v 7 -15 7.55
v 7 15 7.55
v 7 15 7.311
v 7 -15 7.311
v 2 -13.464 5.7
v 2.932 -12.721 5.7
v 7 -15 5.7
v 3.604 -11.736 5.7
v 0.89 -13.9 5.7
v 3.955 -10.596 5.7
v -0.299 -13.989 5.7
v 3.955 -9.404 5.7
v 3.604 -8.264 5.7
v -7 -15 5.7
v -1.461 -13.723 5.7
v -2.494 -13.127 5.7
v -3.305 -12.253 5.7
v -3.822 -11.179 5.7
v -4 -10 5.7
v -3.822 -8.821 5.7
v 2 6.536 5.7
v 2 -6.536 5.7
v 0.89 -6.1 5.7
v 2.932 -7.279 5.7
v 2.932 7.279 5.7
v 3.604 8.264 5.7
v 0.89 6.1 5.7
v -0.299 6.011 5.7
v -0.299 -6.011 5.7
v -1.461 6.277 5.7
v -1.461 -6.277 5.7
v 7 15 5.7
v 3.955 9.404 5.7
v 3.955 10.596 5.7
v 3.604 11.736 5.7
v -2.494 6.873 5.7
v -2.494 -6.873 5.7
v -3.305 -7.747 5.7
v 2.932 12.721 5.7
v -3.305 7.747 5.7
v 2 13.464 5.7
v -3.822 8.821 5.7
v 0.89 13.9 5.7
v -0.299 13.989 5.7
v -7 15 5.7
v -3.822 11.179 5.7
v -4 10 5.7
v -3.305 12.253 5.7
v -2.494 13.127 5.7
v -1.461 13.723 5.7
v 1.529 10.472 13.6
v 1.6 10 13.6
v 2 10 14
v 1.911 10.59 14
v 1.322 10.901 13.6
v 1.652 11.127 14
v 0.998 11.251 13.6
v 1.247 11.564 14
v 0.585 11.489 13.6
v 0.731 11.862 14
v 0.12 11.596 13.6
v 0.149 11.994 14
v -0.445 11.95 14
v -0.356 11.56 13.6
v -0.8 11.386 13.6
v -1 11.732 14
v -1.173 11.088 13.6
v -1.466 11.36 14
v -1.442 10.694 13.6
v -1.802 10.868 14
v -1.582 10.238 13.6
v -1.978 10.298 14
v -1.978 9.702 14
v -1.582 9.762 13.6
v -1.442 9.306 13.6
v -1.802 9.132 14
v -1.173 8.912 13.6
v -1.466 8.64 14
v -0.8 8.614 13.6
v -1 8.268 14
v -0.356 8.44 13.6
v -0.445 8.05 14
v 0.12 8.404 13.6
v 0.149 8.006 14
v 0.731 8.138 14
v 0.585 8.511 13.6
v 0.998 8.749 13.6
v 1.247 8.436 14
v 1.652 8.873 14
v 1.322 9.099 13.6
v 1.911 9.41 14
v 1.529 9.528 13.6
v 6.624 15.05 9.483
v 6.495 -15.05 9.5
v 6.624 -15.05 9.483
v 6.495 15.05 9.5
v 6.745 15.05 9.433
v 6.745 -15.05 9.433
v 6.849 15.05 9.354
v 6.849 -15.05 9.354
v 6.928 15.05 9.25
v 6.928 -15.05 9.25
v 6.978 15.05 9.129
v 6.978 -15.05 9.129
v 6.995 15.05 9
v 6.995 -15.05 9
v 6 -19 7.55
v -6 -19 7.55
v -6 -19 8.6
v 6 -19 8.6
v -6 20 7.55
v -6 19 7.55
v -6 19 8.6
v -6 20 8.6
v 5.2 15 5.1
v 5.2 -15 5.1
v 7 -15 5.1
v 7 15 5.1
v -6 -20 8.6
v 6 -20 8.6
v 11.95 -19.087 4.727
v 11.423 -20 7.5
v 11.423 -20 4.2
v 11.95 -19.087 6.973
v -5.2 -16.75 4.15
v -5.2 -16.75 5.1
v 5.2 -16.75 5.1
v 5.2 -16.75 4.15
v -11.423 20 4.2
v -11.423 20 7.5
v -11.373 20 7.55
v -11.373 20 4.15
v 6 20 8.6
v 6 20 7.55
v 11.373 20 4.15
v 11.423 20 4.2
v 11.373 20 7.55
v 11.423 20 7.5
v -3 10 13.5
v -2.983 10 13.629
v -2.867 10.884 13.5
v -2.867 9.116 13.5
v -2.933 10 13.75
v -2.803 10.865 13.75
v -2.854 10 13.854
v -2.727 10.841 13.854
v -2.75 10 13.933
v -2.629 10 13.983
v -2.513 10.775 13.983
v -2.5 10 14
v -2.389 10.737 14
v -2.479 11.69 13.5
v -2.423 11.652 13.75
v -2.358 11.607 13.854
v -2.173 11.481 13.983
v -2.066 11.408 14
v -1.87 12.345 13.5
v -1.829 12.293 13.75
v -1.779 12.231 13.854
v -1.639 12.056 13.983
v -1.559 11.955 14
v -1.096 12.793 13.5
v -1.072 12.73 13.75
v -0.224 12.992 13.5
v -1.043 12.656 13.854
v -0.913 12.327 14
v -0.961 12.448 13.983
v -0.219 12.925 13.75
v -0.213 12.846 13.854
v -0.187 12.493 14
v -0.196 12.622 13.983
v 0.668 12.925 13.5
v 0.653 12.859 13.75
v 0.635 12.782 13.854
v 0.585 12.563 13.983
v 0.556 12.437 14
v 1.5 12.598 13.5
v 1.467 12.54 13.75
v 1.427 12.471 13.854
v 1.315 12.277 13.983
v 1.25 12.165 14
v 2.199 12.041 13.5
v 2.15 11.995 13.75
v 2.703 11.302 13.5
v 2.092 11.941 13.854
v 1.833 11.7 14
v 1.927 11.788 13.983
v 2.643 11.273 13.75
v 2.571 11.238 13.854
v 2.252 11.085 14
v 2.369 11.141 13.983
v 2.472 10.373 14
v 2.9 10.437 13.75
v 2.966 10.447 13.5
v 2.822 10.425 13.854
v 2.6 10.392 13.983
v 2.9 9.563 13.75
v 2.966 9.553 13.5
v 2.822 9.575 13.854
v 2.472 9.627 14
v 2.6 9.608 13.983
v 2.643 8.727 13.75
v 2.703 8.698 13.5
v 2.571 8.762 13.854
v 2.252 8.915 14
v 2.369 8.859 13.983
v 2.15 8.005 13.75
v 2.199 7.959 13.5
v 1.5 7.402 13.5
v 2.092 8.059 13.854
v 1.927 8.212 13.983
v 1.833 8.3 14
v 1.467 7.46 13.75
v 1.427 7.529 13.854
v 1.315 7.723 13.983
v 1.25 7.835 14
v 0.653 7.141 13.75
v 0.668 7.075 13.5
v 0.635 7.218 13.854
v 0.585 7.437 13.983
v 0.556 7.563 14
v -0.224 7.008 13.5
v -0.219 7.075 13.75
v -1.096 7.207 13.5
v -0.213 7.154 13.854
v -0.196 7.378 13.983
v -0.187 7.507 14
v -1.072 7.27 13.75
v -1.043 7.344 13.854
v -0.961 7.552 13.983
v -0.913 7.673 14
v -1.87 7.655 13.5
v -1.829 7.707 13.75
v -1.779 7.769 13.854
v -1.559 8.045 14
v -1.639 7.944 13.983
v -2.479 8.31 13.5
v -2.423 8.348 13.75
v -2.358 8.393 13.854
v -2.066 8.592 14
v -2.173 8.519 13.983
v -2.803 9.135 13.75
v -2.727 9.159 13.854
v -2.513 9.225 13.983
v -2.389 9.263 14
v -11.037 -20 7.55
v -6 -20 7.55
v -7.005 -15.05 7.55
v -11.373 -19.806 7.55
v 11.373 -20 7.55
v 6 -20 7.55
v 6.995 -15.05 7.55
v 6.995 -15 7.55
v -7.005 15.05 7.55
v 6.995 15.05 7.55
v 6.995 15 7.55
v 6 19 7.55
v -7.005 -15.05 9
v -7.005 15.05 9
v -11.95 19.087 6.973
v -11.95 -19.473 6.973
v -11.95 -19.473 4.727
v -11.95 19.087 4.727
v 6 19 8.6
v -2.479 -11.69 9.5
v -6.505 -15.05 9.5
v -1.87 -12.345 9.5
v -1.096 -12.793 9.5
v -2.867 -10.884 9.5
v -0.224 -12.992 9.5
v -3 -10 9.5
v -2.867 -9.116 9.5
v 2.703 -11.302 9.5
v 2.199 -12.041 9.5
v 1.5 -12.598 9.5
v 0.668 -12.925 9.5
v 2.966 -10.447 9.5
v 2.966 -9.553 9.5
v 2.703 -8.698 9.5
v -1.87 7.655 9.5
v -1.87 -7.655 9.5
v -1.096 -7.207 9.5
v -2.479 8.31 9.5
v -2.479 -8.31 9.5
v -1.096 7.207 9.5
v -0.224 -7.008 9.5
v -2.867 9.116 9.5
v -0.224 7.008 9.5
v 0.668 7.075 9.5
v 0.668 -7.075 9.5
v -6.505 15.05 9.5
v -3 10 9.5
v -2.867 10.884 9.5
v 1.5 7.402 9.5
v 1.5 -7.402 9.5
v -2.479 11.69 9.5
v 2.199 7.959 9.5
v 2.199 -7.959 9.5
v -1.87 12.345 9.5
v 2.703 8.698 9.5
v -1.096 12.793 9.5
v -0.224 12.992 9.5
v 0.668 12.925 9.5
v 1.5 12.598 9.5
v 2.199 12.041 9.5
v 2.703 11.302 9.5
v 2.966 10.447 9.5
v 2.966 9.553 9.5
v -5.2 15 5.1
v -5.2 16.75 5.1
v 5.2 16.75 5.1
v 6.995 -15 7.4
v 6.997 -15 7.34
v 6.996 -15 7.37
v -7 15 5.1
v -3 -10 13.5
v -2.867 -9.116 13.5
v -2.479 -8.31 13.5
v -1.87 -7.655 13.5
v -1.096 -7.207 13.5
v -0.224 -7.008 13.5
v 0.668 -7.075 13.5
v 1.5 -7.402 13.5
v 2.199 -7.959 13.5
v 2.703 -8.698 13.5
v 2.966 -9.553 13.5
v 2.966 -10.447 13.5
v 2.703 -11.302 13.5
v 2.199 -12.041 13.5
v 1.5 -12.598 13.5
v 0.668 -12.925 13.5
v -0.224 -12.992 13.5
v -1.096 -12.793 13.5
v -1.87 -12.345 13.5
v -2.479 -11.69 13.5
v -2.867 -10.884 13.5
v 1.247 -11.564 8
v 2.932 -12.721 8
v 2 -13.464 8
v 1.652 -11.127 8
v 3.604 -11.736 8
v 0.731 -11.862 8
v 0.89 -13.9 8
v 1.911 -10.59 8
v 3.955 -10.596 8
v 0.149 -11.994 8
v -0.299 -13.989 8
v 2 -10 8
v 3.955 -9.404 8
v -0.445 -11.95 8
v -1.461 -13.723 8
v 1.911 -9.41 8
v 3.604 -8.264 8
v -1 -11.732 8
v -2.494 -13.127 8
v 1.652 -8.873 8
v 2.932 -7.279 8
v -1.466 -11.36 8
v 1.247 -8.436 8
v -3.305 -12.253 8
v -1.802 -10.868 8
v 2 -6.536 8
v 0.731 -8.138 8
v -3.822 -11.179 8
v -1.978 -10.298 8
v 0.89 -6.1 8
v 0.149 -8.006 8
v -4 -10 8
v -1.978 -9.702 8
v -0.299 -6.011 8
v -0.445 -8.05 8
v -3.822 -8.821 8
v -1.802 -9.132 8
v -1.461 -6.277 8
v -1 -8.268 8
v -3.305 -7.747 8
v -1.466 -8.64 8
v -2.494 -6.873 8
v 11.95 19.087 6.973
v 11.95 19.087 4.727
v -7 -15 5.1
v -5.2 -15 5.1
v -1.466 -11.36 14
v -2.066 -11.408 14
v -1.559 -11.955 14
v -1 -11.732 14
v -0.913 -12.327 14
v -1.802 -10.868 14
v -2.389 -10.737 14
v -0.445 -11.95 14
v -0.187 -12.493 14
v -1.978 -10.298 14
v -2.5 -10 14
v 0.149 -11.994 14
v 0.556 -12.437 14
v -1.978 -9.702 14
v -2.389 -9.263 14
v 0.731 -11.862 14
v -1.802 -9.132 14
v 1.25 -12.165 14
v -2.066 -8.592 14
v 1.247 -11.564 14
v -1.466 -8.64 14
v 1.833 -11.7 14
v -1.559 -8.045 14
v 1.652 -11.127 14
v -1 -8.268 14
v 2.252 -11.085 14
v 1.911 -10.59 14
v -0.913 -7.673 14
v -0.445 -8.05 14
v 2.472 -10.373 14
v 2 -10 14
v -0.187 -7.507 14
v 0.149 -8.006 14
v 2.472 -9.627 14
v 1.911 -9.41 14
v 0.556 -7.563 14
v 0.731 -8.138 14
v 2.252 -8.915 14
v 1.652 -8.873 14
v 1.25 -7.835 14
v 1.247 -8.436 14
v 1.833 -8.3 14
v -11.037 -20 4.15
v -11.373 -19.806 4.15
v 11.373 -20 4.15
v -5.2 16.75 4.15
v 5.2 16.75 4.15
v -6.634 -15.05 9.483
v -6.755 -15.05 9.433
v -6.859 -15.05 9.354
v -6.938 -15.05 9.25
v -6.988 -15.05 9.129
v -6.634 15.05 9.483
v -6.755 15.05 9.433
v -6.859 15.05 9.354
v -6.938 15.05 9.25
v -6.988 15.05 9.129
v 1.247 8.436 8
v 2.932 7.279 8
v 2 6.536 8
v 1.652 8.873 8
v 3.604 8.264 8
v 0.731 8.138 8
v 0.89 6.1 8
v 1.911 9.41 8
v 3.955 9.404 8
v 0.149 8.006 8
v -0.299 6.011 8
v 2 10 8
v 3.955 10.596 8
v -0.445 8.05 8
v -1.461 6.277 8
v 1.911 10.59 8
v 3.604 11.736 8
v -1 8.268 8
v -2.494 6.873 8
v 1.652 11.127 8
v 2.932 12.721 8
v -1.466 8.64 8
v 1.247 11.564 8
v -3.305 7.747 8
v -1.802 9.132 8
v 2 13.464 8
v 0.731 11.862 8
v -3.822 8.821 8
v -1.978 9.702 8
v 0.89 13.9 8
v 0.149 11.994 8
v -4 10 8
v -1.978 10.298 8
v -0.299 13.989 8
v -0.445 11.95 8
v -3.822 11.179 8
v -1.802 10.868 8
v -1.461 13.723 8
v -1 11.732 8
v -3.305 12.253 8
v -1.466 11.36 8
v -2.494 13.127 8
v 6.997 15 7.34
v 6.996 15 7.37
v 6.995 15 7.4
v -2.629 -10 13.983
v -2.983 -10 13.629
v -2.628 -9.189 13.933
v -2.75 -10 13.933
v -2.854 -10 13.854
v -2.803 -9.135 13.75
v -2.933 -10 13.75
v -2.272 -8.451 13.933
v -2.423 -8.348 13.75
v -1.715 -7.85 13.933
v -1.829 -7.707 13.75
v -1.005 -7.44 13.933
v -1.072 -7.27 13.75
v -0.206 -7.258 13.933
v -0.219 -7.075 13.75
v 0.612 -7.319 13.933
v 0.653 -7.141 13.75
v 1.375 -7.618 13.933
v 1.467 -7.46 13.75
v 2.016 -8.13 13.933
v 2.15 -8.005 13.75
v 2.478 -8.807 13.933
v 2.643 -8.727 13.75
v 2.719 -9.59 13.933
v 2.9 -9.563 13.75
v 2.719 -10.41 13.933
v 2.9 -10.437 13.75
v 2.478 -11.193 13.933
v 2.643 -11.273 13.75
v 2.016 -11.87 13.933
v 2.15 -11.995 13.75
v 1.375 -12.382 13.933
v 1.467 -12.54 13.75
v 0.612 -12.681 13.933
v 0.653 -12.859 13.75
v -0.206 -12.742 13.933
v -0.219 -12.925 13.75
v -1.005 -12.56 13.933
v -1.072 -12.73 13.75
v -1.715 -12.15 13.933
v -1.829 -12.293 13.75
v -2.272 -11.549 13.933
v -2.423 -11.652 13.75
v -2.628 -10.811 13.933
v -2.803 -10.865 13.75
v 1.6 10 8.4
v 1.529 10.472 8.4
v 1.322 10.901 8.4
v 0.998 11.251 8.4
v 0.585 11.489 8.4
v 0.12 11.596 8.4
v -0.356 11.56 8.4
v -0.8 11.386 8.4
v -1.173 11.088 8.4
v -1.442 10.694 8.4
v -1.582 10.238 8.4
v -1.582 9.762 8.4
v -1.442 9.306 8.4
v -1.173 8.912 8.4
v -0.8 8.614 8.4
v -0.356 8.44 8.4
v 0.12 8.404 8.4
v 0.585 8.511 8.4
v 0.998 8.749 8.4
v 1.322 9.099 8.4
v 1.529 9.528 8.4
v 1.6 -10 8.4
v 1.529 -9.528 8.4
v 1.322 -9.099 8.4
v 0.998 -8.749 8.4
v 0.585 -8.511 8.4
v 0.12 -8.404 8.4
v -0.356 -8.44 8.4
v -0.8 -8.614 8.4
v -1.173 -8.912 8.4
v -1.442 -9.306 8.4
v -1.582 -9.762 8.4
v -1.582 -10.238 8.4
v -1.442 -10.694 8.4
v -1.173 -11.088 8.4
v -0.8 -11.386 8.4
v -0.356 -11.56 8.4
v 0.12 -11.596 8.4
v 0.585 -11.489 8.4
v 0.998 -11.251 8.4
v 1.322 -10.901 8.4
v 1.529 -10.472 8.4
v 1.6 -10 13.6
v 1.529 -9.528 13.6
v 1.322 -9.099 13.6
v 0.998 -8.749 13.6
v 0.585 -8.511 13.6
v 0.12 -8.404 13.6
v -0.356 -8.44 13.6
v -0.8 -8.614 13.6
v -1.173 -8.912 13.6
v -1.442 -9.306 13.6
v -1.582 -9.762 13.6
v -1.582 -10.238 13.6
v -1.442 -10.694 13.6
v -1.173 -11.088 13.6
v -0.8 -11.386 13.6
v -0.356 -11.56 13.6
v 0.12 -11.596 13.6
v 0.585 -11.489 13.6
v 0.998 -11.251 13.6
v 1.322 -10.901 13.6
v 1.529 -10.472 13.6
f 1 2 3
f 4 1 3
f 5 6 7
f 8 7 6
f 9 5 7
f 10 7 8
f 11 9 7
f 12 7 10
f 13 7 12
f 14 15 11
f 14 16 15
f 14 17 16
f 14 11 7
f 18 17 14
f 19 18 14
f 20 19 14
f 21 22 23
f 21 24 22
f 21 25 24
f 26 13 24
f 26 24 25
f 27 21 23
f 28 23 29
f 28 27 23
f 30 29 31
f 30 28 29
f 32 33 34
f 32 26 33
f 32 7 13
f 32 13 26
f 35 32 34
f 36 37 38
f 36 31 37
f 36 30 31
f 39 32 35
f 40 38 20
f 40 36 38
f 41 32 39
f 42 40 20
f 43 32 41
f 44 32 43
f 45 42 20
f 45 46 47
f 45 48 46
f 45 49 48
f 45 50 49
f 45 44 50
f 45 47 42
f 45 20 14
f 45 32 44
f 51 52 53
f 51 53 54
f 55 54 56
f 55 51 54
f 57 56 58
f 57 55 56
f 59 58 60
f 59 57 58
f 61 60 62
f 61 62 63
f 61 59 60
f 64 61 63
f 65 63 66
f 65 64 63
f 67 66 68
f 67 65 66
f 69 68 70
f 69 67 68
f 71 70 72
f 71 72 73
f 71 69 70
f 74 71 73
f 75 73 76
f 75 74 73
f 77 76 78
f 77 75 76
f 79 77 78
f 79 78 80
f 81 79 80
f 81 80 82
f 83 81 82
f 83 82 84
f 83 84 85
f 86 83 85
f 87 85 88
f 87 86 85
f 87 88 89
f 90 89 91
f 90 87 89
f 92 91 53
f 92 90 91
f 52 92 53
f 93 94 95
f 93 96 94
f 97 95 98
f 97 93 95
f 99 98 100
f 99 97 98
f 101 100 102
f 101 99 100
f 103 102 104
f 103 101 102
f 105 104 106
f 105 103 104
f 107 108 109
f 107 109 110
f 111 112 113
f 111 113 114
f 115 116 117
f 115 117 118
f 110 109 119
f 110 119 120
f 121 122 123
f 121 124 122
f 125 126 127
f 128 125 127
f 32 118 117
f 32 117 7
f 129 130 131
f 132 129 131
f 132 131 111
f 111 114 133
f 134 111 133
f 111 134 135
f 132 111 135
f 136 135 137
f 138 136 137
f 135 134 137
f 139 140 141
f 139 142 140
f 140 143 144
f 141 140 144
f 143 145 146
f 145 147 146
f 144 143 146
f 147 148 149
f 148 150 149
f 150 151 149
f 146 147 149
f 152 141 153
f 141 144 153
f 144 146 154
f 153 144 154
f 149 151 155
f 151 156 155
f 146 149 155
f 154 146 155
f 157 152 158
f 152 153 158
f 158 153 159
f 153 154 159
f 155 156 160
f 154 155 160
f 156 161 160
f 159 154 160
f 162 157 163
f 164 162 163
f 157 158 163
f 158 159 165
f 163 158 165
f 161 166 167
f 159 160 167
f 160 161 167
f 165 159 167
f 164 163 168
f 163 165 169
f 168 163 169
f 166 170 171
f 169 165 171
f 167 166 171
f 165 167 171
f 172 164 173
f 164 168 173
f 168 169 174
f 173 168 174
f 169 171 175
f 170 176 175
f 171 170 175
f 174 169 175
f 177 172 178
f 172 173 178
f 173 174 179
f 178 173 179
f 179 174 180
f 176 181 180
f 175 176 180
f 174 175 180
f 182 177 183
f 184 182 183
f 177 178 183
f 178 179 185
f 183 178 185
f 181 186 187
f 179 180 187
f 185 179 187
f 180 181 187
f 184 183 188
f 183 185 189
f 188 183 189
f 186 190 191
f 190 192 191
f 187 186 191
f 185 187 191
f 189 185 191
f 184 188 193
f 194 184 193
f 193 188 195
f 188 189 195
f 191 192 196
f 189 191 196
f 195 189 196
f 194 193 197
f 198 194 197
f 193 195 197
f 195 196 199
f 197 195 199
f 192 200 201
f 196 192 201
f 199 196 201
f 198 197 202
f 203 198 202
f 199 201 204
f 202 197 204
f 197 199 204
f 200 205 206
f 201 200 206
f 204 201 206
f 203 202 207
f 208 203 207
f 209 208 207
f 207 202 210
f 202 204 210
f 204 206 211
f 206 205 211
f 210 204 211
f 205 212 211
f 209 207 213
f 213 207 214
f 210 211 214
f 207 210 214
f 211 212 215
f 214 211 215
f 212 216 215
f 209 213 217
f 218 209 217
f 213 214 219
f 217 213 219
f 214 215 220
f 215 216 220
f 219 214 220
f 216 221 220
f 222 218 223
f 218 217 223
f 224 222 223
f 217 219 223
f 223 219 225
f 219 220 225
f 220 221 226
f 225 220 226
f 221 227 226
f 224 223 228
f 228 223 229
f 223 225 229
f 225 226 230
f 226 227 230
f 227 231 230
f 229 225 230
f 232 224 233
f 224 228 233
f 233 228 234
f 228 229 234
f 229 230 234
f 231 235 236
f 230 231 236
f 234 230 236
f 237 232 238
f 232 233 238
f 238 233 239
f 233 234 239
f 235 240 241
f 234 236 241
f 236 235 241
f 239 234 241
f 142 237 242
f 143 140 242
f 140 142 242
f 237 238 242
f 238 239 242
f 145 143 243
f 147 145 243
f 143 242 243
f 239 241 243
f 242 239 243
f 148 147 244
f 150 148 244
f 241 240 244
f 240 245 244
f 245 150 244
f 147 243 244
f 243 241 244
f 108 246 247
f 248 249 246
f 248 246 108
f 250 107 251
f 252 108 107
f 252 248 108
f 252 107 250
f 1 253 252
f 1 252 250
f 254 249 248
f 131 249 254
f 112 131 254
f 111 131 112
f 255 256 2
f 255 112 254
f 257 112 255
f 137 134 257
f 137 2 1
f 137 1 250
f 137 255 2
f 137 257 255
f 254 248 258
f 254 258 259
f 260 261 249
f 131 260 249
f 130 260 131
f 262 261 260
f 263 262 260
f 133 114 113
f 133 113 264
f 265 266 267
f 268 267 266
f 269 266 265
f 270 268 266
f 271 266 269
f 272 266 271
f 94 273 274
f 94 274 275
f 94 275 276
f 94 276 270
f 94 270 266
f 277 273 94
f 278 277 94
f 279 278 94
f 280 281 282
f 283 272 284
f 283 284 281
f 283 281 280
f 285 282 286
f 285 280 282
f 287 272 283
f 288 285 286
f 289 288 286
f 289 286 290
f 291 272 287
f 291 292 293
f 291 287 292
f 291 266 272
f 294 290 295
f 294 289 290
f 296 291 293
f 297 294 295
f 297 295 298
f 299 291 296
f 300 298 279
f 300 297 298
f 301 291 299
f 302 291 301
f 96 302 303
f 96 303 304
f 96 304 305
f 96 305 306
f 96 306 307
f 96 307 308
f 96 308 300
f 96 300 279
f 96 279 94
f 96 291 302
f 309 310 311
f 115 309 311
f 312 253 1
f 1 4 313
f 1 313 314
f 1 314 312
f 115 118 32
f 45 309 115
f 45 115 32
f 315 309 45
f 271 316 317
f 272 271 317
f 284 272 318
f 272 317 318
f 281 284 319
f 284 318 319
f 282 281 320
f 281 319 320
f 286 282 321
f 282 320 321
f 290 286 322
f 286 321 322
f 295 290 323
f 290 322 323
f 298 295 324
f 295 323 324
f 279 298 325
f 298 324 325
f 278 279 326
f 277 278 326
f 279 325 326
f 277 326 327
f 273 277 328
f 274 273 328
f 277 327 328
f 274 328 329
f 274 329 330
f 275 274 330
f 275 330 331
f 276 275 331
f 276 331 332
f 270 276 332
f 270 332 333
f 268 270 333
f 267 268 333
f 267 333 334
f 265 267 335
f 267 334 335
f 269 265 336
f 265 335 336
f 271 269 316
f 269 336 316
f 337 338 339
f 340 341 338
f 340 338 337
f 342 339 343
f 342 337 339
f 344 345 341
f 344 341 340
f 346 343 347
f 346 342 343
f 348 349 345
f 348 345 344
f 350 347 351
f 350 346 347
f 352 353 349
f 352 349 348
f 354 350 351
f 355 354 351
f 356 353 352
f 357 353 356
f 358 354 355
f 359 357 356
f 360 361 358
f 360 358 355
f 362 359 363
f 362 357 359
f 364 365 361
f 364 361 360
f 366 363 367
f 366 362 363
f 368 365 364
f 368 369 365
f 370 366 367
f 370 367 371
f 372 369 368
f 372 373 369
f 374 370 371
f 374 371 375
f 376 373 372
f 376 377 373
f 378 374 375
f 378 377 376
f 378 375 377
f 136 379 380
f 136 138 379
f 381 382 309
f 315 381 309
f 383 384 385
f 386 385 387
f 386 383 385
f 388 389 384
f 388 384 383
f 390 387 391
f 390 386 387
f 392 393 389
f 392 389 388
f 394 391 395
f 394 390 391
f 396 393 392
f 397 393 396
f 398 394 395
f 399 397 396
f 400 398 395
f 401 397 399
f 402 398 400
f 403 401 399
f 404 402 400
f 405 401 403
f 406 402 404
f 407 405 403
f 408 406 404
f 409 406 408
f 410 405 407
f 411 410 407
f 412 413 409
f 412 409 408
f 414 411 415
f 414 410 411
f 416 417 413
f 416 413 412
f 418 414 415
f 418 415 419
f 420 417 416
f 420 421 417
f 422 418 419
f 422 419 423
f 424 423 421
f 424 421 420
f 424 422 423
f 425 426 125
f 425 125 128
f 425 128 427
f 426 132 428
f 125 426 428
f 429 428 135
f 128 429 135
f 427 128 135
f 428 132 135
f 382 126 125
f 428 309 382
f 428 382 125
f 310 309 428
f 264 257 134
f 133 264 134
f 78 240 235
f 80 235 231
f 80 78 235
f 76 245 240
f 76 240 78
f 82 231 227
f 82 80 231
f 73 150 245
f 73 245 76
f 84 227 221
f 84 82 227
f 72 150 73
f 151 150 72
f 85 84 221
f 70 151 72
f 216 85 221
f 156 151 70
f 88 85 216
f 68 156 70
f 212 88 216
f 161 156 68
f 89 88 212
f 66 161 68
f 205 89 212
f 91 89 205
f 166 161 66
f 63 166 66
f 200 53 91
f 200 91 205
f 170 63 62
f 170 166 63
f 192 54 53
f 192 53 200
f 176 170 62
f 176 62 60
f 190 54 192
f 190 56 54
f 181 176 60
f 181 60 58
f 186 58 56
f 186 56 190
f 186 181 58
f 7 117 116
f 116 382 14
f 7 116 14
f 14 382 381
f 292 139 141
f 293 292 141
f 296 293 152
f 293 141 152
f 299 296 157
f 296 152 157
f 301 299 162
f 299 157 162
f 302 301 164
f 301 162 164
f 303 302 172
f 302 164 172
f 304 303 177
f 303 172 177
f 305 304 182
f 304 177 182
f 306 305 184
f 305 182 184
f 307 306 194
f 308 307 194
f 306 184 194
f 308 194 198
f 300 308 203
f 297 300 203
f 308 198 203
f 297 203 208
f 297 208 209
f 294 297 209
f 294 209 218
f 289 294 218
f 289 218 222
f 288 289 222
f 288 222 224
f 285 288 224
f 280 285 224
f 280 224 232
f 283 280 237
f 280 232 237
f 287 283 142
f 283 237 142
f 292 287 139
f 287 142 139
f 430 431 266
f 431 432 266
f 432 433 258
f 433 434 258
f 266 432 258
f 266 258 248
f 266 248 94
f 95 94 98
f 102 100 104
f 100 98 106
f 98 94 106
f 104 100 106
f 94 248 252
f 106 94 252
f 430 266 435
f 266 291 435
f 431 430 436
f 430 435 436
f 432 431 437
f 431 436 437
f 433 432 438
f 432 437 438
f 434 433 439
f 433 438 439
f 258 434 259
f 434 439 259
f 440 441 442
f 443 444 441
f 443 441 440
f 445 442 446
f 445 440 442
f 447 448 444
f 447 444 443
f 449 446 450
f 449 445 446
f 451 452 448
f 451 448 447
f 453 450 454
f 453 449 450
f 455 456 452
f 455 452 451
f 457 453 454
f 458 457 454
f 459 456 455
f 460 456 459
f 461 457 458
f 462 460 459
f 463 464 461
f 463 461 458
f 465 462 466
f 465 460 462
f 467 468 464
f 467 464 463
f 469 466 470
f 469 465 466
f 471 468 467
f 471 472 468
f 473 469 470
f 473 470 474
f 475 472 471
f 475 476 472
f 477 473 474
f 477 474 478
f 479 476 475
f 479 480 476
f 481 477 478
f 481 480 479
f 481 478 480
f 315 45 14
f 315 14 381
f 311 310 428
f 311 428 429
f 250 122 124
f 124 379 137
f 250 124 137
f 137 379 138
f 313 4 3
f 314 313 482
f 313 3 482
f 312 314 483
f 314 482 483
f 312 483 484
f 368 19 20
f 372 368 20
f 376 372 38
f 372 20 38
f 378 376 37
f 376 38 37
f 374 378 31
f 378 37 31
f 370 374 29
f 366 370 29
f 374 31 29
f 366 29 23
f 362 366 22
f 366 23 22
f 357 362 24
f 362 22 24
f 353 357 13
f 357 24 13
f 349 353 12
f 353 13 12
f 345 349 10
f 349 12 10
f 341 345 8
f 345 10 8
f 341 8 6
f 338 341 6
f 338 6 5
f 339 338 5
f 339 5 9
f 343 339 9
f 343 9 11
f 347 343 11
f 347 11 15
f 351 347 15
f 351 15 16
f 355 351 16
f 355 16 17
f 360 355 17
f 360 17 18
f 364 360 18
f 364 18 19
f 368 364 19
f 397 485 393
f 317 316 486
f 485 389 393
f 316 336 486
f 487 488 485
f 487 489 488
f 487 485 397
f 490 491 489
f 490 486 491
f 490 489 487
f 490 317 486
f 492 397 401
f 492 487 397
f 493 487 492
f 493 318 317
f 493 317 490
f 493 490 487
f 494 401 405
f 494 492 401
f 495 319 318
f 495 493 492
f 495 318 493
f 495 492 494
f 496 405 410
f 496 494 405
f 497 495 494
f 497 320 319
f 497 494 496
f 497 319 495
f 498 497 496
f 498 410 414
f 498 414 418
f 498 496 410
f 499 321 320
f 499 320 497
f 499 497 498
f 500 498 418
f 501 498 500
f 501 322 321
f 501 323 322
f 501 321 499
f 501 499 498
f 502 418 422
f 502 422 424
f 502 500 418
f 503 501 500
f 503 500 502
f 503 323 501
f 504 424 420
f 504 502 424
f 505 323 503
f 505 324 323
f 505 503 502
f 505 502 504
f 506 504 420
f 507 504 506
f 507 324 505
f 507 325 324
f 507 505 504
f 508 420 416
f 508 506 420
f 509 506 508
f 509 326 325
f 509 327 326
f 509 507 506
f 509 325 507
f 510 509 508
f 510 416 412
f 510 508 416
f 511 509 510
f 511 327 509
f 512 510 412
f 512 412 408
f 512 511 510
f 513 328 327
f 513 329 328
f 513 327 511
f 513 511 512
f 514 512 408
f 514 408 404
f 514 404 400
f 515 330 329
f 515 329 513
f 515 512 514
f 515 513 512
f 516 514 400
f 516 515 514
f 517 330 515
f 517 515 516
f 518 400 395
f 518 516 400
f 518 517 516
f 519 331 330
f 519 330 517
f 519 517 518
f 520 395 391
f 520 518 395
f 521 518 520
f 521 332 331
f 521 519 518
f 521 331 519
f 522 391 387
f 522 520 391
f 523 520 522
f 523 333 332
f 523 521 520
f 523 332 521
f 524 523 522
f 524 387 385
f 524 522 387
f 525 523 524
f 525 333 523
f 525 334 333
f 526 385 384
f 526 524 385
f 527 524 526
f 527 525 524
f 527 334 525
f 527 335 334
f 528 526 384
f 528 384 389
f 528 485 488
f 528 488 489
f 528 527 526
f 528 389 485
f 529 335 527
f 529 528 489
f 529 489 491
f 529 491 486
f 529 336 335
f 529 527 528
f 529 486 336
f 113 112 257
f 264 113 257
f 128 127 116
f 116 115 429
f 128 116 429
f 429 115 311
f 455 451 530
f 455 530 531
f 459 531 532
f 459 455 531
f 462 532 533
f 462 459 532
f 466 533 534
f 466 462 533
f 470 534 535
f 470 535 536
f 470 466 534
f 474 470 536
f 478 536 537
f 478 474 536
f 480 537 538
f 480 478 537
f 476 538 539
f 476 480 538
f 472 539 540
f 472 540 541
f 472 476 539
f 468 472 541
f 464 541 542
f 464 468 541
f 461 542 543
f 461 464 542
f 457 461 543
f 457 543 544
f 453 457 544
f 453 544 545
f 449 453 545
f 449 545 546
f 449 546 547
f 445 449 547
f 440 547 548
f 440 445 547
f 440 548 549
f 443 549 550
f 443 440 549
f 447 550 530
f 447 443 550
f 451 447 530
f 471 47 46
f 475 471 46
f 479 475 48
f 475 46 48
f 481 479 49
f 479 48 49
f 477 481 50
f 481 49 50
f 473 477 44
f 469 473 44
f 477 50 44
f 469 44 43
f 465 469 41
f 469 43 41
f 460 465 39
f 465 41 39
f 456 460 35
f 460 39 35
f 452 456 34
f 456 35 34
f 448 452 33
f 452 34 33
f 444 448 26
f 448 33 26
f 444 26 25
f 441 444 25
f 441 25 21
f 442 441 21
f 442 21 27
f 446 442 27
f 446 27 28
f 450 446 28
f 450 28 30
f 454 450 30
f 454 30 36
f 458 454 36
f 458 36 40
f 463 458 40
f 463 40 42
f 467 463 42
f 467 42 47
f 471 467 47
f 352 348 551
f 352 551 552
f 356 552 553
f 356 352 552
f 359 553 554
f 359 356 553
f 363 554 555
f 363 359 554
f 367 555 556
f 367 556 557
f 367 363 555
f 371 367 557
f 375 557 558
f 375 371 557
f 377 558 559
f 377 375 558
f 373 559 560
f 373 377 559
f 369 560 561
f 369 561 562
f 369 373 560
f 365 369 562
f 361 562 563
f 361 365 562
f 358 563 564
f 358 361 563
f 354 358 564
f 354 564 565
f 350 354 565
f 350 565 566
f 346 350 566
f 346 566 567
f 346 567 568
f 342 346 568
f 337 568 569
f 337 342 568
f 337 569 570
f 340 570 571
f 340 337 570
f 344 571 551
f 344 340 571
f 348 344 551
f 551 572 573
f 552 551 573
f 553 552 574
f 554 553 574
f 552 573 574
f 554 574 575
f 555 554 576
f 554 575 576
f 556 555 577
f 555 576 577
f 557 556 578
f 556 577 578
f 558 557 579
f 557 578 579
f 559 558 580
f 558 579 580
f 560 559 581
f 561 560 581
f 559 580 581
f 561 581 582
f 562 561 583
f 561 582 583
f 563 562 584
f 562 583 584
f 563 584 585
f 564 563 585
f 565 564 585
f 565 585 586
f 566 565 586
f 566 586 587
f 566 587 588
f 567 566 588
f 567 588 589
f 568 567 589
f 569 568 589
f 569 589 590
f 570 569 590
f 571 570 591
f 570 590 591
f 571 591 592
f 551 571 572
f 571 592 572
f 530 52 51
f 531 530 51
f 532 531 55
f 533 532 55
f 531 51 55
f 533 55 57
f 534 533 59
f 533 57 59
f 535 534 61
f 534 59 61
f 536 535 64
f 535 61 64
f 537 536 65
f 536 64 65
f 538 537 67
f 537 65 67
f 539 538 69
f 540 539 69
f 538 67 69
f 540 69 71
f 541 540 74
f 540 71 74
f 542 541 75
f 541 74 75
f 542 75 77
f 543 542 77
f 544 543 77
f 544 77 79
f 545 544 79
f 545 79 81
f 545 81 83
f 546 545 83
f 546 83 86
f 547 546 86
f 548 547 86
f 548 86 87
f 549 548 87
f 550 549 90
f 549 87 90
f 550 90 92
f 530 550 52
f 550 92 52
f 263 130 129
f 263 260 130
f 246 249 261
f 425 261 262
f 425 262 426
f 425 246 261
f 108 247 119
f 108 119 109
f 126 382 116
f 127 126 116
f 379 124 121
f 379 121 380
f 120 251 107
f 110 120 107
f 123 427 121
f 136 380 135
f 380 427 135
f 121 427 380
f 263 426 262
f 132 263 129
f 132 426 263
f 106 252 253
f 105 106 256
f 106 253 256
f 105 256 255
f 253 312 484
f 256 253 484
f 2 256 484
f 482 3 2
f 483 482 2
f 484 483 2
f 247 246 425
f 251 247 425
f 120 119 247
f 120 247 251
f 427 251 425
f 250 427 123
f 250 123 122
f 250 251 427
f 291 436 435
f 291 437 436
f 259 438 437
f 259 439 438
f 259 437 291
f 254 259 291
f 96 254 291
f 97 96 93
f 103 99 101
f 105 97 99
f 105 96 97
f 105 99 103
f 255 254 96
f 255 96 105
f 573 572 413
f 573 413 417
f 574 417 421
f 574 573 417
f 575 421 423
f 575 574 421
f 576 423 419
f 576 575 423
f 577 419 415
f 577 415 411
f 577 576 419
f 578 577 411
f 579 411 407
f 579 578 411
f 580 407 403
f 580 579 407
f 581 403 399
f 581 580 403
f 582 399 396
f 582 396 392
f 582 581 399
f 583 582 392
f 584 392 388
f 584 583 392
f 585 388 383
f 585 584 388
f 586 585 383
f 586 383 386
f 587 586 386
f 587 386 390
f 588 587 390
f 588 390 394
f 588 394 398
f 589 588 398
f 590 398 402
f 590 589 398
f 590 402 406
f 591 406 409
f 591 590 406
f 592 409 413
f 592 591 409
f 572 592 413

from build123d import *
from OCP.BRepFilletAPI import BRepFilletAPI_MakeChamfer

# Parameters (mm, degrees)
ESQUISSE1_W                                        = 23.9
ESQUISSE1_H                                        = 40
BOSS_EXTRU_1_DEPTH                                 = 3.4
ENL_V_MAT_EXTRU_1_DEPTH                            = 30
ESQUISSE3_W                                        = 14
ESQUISSE3_H                                        = 30.1
BOSS_EXTRU_2_DEPTH                                 = 1.95
ESQUISSE4_W                                        = 10.4
ESQUISSE4_H                                        = 30
ENL_V_MAT_EXTRU_2_DEPTH                            = 1.55
ENL_V_MAT_EXTRU_3_REACH                            = 25.71
ESQUISSE6_W                                        = 10.4
ESQUISSE6_H                                        = 1.75
ENL_V_MAT_EXTRU_4_REACH                            = 25.71
ESQUISSE8_W                                        = 10.4
ESQUISSE8_H                                        = 1.75
ESQUISSE9_W                                        = 0.6
ESQUISSE9_H                                        = 30
ENL_V_MAT_EXTRU_5_DEPTH                            = 1.8
ESQUISSE10_W                                       = 0.6
ESQUISSE10_H                                       = 30
ENL_V_MAT_EXTRU_6_DEPTH                            = 1.8
ESQUISSE11_W                                       = 12
ESQUISSE11_H                                       = 1
BOSS_EXTRU_3_DEPTH                                 = 1.05
ESQUISSE12_W                                       = 12
ESQUISSE12_H                                       = 1
BOSS_EXTRU_4_DEPTH                                 = 1.05
ESQUISSE13_W                                       = 3
ESQUISSE13_H                                       = 4.5
ESQUISSE14_W                                       = 3
ESQUISSE14_H                                       = 4.5
CHAMBRAGE_POUR_VIS_T_TE_HEXAGONALE_M31_D           = 3.2
CHAMBRAGE_POUR_VIS_T_TE_HEXAGONALE_M31_CBORE_D     = 8
CHAMBRAGE_POUR_VIS_T_TE_HEXAGONALE_M31_CBORE_DEPTH = 2.3
CHANFREIN1_SIZE                                    = 0.913344887
CHANFREIN1_SIZE2                                   = 0.527
CHANFREIN2_SIZE                                    = 0.527
CHANFREIN2_SIZE2                                   = 0.913344887
CHANFREIN3_SIZE                                    = 0.577
CHANFREIN4_SIZE                                    = 0.4
CONG_1_R                                           = 0.5


with BuildPart() as part:
    # Esquisse1 → Boss.-Extru.1 (new body)
    with BuildSketch(Plane.XY.offset(7.55)):
        Rectangle(ESQUISSE1_W, ESQUISSE1_H)
    extrude(amount=-BOSS_EXTRU_1_DEPTH)

    # Esquisse2 → Enlèv. mat.-Extru.1 (cut)
    with BuildSketch(Plane(origin=(0, 15, 0), x_dir=(1, 0, 0), z_dir=(0, 1, 0))):
        with BuildLine():
            Line((6.995, -7.4), (6.995, -7.55))
            Line((6.995, -7.55), (7, -7.55))
            Line((7, -7.55), (7, -7.310697145))
            ThreePointArc((7, -7.310697145), (6.996250978, -7.35527864), (6.995, -7.4))
        make_face()
    extrude(amount=-ENL_V_MAT_EXTRU_1_DEPTH, mode=Mode.SUBTRACT)

    # Esquisse3 → Boss.-Extru.2 (add)
    with BuildSketch(Plane.XY.offset(7.55)):
        with Locations((-0.005, 0)):
            Rectangle(ESQUISSE3_W, ESQUISSE3_H)
    extrude(amount=BOSS_EXTRU_2_DEPTH)

    # Esquisse4 → Enlèv. mat.-Extru.2 (cut)
    with BuildSketch(Plane(origin=(0, 0, 4.15), x_dir=(-1, 0, 0), z_dir=(0, 0, -1))):
        Rectangle(ESQUISSE4_W, ESQUISSE4_H)
    extrude(amount=-ENL_V_MAT_EXTRU_2_DEPTH, mode=Mode.SUBTRACT)

    # Esquisse6 → Enlèv. mat.-Extru.3 (cut, up to next)
    with BuildSketch(Plane.XY.offset(5.1), mode=Mode.PRIVATE) as enl_v_mat_extru_3_sk1:
        with Locations((0, -15.875)):
            Rectangle(ESQUISSE6_W, ESQUISSE6_H)
    enl_v_mat_extru_3_tool1 = extrude(enl_v_mat_extru_3_sk1.sketch, amount=-ENL_V_MAT_EXTRU_3_REACH, mode=Mode.PRIVATE) & part.part
    add(enl_v_mat_extru_3_tool1.solids().sort_by_distance((0, -15.875, 5.1))[0], mode=Mode.SUBTRACT)

    # Esquisse8 → Enlèv. mat.-Extru.4 (cut, up to next)
    with BuildSketch(Plane.XY.offset(5.1), mode=Mode.PRIVATE) as enl_v_mat_extru_4_sk1:
        with Locations((0, 15.875)):
            Rectangle(ESQUISSE8_W, ESQUISSE8_H)
    enl_v_mat_extru_4_tool1 = extrude(enl_v_mat_extru_4_sk1.sketch, amount=-ENL_V_MAT_EXTRU_4_REACH, mode=Mode.PRIVATE) & part.part
    add(enl_v_mat_extru_4_tool1.solids().sort_by_distance((0, 15.875, 5.1))[0], mode=Mode.SUBTRACT)

    # Esquisse9 → Enlèv. mat.-Extru.5 (cut)
    with BuildSketch(Plane.ZY.offset(-5.2)):
        with Locations((5.4, 0)):
            Rectangle(ESQUISSE9_W, ESQUISSE9_H)
    extrude(amount=-ENL_V_MAT_EXTRU_5_DEPTH, mode=Mode.SUBTRACT)

    # Esquisse10 → Enlèv. mat.-Extru.6 (cut)
    with BuildSketch(Plane(origin=(-5.2, 0, 0), x_dir=(0, 0, -1), z_dir=(1, 0, 0))):
        with Locations((-5.4, 0)):
            Rectangle(ESQUISSE10_W, ESQUISSE10_H)
    extrude(amount=-ENL_V_MAT_EXTRU_6_DEPTH, mode=Mode.SUBTRACT)

    # Esquisse11 → Boss.-Extru.3 (add)
    with BuildSketch(Plane.XY.offset(7.55)):
        with Locations((0, -19.5)):
            Rectangle(ESQUISSE11_W, ESQUISSE11_H)
    extrude(amount=BOSS_EXTRU_3_DEPTH)

    # Esquisse12 → Boss.-Extru.4 (add)
    with BuildSketch(Plane.XY.offset(7.55)):
        with Locations((0, 19.5)):
            Rectangle(ESQUISSE12_W, ESQUISSE12_H)
    extrude(amount=BOSS_EXTRU_4_DEPTH)

    # Esquisse13 → Révolution1 (revolve)
    with BuildSketch(Plane.XZ.offset(-10), mode=Mode.PRIVATE) as r_volution1_sk:
        with Locations((1.5, 11.75)):
            Rectangle(ESQUISSE13_W, ESQUISSE13_H)
    revolve(r_volution1_sk.sketch.rotate(Axis((0, 10, 14), (0, 0, -1)), 180), axis=Axis((0, 10, 14), (0, 0, -1)))

    # Esquisse14 → Révolution2 (revolve)
    with BuildSketch(Plane.XZ.offset(10), mode=Mode.PRIVATE) as r_volution2_sk:
        with Locations((1.5, 11.75)):
            Rectangle(ESQUISSE14_W, ESQUISSE14_H)
    revolve(r_volution2_sk.sketch.rotate(Axis((0, -10, 14), (0, 0, -1)), 180), axis=Axis((0, -10, 14), (0, 0, -1)))

    # Chambrage pour vis à tête hexagonale M31 (through all)
    with Locations(Plane(origin=(0, 0, 5.7), x_dir=(-1, 0, 0), z_dir=(0, 0, -1))):
        with Locations((0, -10), (0, 10)):
            CounterBoreHole(CHAMBRAGE_POUR_VIS_T_TE_HEXAGONALE_M31_D / 2, CHAMBRAGE_POUR_VIS_T_TE_HEXAGONALE_M31_CBORE_D / 2, CHAMBRAGE_POUR_VIS_T_TE_HEXAGONALE_M31_CBORE_DEPTH)

    # Chanfrein1
    chanfrein1_edges = [part.edges().sort_by_distance(p)[0] for p in [
        (11.95, 20, 5.85),
    ]]
    chanfrein1_side = [part.faces().sort_by_distance(p)[0] for p in [
        (11.95, 0, 5.85),
    ]]
    chamfer(chanfrein1_edges, length=CHANFREIN1_SIZE, length2=CHANFREIN1_SIZE2, reference=chanfrein1_side[0])

    # Chanfrein2: one chamfer whose edges measure the first distance from different faces: ONE call of the kernel's chamfer builder (chamfer() names one face for all edges)
    chanfrein2_edges_1 = [part.edges().sort_by_distance(p)[0] for p in [
        (11.95, -20, 5.85),
    ]]
    chanfrein2_side_1 = [part.faces().sort_by_distance(p)[0] for p in [
        (0, -20, 6.148689538),
    ]]
    chanfrein2_edges_2 = [part.edges().sort_by_distance(p)[0] for p in [
        (-11.95, -20, 5.85),
    ]]
    chanfrein2_side_2 = [part.faces().sort_by_distance(p)[0] for p in [
        (-11.95, 0, 5.85),
    ]]
    chanfrein2_edges_3 = [part.edges().sort_by_distance(p)[0] for p in [
        (-11.95, 20, 5.85),
    ]]
    chanfrein2_side_3 = [part.faces().sort_by_distance(p)[0] for p in [
        (-0.227438689, 20, 6.154502532),
    ]]
    chanfrein2 = BRepFilletAPI_MakeChamfer(part.part.solid().wrapped)
    for e in chanfrein2_edges_1:
        chanfrein2.Add(CHANFREIN2_SIZE, CHANFREIN2_SIZE2, e.wrapped, chanfrein2_side_1[0].wrapped)  # the first distance lies on this face
    for e in chanfrein2_edges_2:
        chanfrein2.Add(CHANFREIN2_SIZE, CHANFREIN2_SIZE2, e.wrapped, chanfrein2_side_2[0].wrapped)  # the first distance lies on this face
    for e in chanfrein2_edges_3:
        chanfrein2.Add(CHANFREIN2_SIZE, CHANFREIN2_SIZE2, e.wrapped, chanfrein2_side_3[0].wrapped)  # the first distance lies on this face
    add(Compound.cast(chanfrein2.Shape()), mode=Mode.REPLACE)

    # Chanfrein3
    chanfrein3_edges = [part.edges().sort_by_distance(p)[0] for p in [
        (-11.95, -0.193172444, 4.15),
        (-11.95, -0.193172444, 7.55),
        (11.95, 0, 4.15),
        (11.95, 0, 7.55),
    ]]
    chamfer(chanfrein3_edges, length=CHANFREIN3_SIZE)

    # Chanfrein4
    chanfrein4_edges = [part.edges().sort_by_distance(p)[0] for p in [
        (-1.6, 10, 14),
        (-1.6, 10, 8),
        (-1.6, -10, 14),
        (-1.6, -10, 8),
    ]]
    chamfer(chanfrein4_edges, length=CHANFREIN4_SIZE)

    # Congé1
    cong_1_edges = [part.edges().sort_by_distance(p)[0] for p in [
        (3, 10, 14),
        (3, -10, 14),
        (-7.005, 0, 9.5),
        (6.995, 0, 9.5),
    ]]
    fillet(cong_1_edges, radius=CONG_1_R)


solid = part.part
